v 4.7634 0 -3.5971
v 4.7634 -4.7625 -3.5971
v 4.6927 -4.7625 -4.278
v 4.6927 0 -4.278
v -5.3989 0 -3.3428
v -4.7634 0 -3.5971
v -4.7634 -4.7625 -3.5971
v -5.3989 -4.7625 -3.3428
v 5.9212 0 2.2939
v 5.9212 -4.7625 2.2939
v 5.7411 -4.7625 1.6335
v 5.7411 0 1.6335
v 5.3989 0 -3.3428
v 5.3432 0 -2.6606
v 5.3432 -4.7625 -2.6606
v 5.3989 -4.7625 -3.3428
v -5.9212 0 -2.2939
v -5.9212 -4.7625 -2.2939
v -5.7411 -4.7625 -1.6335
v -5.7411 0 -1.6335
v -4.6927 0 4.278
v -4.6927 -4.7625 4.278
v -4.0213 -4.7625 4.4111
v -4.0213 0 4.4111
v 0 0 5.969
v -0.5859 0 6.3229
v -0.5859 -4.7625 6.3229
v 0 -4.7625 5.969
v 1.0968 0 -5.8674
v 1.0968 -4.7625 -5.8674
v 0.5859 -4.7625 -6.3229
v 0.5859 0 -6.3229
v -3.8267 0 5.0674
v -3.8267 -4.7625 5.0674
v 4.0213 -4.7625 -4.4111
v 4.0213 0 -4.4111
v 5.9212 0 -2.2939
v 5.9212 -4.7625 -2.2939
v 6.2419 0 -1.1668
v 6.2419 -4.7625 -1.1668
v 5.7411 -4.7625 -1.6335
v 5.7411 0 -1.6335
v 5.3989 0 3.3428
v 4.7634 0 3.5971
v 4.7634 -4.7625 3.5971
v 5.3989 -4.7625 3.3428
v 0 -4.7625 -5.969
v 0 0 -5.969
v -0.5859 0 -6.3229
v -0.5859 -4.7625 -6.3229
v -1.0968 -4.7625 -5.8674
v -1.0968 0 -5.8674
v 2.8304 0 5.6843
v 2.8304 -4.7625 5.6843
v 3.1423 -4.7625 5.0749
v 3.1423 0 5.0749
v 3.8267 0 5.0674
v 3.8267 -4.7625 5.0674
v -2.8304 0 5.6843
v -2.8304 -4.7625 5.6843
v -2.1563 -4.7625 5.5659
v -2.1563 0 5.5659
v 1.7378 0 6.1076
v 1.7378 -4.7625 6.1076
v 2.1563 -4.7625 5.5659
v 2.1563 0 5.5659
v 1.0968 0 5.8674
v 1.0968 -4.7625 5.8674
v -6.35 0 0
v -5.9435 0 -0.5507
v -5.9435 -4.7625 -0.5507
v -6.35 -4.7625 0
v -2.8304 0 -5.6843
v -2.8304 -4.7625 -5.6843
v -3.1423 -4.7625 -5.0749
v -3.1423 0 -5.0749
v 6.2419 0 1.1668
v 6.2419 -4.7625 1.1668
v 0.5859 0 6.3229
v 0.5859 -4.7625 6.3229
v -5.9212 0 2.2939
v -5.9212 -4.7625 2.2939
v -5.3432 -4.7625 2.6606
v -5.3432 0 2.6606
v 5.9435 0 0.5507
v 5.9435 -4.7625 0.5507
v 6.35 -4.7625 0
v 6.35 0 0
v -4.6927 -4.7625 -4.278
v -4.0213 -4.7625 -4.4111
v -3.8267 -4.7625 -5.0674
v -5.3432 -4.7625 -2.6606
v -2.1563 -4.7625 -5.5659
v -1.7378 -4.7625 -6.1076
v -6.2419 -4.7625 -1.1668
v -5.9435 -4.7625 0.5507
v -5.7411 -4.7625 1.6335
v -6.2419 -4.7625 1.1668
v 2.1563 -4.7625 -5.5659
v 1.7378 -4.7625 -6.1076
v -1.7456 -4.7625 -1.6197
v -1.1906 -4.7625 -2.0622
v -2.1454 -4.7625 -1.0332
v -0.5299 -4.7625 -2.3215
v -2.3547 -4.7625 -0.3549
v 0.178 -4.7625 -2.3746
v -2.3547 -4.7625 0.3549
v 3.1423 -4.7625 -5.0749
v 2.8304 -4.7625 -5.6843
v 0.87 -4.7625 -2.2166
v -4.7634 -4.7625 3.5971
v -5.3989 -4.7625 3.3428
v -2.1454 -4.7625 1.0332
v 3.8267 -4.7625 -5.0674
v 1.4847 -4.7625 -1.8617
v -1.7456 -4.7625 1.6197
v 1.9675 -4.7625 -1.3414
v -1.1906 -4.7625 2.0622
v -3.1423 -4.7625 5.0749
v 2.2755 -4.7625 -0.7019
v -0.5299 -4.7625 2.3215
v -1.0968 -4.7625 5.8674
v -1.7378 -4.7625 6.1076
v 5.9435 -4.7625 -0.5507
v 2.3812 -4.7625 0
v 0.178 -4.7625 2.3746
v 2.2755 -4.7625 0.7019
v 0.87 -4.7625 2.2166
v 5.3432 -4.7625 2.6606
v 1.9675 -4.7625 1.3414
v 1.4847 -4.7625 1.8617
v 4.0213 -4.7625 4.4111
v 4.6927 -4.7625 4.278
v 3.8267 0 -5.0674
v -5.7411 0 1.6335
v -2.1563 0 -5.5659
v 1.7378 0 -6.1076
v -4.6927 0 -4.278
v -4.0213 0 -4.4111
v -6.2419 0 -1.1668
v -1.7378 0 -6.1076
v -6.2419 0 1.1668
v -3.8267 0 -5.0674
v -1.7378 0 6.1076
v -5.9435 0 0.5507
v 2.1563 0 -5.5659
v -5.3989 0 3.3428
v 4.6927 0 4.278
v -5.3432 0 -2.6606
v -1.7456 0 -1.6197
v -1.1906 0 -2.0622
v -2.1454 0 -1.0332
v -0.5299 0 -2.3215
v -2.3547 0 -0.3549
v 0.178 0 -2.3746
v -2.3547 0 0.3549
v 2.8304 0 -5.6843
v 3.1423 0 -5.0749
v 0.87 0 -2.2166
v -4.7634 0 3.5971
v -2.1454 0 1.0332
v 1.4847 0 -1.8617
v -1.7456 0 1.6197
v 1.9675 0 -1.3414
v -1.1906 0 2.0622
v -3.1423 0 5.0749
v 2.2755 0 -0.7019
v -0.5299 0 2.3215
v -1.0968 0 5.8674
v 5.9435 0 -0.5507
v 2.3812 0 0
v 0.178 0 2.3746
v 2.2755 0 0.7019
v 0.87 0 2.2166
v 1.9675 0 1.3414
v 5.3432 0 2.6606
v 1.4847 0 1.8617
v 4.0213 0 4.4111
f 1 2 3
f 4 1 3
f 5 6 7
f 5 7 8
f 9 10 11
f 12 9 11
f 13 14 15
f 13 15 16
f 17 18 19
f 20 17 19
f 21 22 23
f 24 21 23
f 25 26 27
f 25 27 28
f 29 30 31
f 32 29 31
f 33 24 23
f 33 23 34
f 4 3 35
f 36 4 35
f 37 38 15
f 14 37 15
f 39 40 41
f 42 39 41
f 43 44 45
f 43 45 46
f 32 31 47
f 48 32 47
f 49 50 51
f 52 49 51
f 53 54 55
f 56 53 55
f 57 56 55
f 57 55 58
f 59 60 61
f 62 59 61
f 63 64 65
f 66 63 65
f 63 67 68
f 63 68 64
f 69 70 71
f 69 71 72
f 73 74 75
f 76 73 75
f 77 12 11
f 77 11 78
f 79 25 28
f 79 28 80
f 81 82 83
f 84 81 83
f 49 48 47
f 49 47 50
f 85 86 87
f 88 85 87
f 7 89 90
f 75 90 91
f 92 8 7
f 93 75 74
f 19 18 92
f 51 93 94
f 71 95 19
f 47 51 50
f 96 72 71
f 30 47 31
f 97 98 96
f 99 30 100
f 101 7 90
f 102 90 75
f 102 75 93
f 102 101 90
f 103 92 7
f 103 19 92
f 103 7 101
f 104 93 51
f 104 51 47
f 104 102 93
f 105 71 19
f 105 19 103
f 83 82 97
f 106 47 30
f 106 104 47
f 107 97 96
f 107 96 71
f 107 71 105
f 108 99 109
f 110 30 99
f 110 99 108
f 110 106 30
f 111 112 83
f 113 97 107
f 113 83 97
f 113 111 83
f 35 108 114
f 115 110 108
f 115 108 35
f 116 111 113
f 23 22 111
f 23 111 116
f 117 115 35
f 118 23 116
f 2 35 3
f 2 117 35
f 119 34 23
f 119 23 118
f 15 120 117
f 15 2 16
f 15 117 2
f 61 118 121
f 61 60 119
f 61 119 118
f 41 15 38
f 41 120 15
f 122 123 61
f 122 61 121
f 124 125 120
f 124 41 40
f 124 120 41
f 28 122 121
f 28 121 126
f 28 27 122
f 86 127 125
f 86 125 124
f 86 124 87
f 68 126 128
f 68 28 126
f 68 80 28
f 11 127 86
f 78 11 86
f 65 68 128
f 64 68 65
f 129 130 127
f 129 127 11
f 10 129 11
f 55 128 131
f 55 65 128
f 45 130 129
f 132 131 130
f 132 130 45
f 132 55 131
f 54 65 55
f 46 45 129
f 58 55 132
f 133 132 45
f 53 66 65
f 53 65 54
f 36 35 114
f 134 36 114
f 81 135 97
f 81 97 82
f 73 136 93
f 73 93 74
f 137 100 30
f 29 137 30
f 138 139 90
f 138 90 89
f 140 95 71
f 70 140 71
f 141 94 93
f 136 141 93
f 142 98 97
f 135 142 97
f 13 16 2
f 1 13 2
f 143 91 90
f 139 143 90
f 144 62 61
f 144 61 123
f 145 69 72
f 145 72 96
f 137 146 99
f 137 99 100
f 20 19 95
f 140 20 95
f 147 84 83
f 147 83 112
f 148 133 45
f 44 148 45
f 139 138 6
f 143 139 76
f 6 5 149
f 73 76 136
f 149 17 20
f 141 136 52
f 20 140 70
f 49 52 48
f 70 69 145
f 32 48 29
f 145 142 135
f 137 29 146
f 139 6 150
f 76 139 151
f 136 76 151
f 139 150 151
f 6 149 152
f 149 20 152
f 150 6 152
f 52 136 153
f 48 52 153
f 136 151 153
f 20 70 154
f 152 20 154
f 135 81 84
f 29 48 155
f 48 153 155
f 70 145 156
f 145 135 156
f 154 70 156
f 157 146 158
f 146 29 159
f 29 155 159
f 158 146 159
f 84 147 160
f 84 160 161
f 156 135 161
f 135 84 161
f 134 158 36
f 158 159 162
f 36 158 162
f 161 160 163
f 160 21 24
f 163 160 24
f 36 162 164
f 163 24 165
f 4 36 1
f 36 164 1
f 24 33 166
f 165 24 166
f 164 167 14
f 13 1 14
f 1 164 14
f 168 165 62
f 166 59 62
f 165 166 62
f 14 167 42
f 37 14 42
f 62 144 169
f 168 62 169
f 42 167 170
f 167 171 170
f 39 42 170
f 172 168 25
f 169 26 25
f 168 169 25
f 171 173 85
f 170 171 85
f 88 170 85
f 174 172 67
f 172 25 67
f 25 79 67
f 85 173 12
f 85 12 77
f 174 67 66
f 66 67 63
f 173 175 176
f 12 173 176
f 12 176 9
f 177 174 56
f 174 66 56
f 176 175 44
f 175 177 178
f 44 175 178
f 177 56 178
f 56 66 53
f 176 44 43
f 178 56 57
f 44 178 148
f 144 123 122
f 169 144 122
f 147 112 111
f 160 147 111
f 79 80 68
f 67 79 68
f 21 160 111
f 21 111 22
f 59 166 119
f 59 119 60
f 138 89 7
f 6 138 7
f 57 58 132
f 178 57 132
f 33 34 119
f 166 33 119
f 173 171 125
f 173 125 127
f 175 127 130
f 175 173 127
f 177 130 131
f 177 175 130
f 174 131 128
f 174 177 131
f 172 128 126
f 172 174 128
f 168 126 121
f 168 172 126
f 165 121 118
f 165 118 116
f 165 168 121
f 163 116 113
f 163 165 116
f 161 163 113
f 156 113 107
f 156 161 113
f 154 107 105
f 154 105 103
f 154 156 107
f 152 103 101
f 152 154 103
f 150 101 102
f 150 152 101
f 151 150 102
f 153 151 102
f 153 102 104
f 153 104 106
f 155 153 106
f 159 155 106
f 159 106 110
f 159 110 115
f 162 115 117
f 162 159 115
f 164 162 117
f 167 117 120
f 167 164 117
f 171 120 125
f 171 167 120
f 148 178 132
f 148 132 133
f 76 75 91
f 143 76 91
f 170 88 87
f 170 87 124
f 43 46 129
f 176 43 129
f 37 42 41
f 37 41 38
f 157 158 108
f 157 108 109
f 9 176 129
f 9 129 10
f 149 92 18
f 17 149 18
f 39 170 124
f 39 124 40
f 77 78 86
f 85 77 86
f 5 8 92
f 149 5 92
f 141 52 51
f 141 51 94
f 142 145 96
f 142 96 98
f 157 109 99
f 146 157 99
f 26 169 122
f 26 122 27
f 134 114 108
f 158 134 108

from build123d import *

# Parameters (mm, degrees)
F0_R            = 6.35
F0_R_2          = 2.38125
F1_DEPTH        = 4.7625
F3_DEPTH        = 4.7635
F3_COPIES_COUNT = 34


# Not quite as in the source:
# - a pattern or mirror of a feature is missing from the dataset's text; its kind, count and spacing are read off the source's solid


with BuildPart() as f1:
    # F0 (on Front) → F1 (new body)
    with BuildSketch(Plane.XZ):
        Circle(F0_R)
        Circle(F0_R_2, mode=Mode.SUBTRACT)
    extrude(amount=F1_DEPTH)

    # F2 (on Front) → F3 (cut, through all)
    with BuildSketch(Plane.XZ):
        with BuildLine():
            Line((-0.5859040826, 6.3229120195), (0, 5.969))
            Line((0, 5.969), (0.5859040826, 6.3229120195))
            ThreePointArc((0.5859040826, 6.3229120195), (0, 6.4661394577), (-0.5859040826, 6.3229120195))
        make_face()
    f3 = extrude(amount=F3_DEPTH, mode=Mode.SUBTRACT)

    # F3_copies: F3 ×34 about axis
    f3_copies_axis = Axis((0, 0, 0), (0, 1, 0))
    for i in range(1, F3_COPIES_COUNT):
        add(f3.rotate(f3_copies_axis, i * 360 / F3_COPIES_COUNT), mode=Mode.SUBTRACT)


solid = f1.part
